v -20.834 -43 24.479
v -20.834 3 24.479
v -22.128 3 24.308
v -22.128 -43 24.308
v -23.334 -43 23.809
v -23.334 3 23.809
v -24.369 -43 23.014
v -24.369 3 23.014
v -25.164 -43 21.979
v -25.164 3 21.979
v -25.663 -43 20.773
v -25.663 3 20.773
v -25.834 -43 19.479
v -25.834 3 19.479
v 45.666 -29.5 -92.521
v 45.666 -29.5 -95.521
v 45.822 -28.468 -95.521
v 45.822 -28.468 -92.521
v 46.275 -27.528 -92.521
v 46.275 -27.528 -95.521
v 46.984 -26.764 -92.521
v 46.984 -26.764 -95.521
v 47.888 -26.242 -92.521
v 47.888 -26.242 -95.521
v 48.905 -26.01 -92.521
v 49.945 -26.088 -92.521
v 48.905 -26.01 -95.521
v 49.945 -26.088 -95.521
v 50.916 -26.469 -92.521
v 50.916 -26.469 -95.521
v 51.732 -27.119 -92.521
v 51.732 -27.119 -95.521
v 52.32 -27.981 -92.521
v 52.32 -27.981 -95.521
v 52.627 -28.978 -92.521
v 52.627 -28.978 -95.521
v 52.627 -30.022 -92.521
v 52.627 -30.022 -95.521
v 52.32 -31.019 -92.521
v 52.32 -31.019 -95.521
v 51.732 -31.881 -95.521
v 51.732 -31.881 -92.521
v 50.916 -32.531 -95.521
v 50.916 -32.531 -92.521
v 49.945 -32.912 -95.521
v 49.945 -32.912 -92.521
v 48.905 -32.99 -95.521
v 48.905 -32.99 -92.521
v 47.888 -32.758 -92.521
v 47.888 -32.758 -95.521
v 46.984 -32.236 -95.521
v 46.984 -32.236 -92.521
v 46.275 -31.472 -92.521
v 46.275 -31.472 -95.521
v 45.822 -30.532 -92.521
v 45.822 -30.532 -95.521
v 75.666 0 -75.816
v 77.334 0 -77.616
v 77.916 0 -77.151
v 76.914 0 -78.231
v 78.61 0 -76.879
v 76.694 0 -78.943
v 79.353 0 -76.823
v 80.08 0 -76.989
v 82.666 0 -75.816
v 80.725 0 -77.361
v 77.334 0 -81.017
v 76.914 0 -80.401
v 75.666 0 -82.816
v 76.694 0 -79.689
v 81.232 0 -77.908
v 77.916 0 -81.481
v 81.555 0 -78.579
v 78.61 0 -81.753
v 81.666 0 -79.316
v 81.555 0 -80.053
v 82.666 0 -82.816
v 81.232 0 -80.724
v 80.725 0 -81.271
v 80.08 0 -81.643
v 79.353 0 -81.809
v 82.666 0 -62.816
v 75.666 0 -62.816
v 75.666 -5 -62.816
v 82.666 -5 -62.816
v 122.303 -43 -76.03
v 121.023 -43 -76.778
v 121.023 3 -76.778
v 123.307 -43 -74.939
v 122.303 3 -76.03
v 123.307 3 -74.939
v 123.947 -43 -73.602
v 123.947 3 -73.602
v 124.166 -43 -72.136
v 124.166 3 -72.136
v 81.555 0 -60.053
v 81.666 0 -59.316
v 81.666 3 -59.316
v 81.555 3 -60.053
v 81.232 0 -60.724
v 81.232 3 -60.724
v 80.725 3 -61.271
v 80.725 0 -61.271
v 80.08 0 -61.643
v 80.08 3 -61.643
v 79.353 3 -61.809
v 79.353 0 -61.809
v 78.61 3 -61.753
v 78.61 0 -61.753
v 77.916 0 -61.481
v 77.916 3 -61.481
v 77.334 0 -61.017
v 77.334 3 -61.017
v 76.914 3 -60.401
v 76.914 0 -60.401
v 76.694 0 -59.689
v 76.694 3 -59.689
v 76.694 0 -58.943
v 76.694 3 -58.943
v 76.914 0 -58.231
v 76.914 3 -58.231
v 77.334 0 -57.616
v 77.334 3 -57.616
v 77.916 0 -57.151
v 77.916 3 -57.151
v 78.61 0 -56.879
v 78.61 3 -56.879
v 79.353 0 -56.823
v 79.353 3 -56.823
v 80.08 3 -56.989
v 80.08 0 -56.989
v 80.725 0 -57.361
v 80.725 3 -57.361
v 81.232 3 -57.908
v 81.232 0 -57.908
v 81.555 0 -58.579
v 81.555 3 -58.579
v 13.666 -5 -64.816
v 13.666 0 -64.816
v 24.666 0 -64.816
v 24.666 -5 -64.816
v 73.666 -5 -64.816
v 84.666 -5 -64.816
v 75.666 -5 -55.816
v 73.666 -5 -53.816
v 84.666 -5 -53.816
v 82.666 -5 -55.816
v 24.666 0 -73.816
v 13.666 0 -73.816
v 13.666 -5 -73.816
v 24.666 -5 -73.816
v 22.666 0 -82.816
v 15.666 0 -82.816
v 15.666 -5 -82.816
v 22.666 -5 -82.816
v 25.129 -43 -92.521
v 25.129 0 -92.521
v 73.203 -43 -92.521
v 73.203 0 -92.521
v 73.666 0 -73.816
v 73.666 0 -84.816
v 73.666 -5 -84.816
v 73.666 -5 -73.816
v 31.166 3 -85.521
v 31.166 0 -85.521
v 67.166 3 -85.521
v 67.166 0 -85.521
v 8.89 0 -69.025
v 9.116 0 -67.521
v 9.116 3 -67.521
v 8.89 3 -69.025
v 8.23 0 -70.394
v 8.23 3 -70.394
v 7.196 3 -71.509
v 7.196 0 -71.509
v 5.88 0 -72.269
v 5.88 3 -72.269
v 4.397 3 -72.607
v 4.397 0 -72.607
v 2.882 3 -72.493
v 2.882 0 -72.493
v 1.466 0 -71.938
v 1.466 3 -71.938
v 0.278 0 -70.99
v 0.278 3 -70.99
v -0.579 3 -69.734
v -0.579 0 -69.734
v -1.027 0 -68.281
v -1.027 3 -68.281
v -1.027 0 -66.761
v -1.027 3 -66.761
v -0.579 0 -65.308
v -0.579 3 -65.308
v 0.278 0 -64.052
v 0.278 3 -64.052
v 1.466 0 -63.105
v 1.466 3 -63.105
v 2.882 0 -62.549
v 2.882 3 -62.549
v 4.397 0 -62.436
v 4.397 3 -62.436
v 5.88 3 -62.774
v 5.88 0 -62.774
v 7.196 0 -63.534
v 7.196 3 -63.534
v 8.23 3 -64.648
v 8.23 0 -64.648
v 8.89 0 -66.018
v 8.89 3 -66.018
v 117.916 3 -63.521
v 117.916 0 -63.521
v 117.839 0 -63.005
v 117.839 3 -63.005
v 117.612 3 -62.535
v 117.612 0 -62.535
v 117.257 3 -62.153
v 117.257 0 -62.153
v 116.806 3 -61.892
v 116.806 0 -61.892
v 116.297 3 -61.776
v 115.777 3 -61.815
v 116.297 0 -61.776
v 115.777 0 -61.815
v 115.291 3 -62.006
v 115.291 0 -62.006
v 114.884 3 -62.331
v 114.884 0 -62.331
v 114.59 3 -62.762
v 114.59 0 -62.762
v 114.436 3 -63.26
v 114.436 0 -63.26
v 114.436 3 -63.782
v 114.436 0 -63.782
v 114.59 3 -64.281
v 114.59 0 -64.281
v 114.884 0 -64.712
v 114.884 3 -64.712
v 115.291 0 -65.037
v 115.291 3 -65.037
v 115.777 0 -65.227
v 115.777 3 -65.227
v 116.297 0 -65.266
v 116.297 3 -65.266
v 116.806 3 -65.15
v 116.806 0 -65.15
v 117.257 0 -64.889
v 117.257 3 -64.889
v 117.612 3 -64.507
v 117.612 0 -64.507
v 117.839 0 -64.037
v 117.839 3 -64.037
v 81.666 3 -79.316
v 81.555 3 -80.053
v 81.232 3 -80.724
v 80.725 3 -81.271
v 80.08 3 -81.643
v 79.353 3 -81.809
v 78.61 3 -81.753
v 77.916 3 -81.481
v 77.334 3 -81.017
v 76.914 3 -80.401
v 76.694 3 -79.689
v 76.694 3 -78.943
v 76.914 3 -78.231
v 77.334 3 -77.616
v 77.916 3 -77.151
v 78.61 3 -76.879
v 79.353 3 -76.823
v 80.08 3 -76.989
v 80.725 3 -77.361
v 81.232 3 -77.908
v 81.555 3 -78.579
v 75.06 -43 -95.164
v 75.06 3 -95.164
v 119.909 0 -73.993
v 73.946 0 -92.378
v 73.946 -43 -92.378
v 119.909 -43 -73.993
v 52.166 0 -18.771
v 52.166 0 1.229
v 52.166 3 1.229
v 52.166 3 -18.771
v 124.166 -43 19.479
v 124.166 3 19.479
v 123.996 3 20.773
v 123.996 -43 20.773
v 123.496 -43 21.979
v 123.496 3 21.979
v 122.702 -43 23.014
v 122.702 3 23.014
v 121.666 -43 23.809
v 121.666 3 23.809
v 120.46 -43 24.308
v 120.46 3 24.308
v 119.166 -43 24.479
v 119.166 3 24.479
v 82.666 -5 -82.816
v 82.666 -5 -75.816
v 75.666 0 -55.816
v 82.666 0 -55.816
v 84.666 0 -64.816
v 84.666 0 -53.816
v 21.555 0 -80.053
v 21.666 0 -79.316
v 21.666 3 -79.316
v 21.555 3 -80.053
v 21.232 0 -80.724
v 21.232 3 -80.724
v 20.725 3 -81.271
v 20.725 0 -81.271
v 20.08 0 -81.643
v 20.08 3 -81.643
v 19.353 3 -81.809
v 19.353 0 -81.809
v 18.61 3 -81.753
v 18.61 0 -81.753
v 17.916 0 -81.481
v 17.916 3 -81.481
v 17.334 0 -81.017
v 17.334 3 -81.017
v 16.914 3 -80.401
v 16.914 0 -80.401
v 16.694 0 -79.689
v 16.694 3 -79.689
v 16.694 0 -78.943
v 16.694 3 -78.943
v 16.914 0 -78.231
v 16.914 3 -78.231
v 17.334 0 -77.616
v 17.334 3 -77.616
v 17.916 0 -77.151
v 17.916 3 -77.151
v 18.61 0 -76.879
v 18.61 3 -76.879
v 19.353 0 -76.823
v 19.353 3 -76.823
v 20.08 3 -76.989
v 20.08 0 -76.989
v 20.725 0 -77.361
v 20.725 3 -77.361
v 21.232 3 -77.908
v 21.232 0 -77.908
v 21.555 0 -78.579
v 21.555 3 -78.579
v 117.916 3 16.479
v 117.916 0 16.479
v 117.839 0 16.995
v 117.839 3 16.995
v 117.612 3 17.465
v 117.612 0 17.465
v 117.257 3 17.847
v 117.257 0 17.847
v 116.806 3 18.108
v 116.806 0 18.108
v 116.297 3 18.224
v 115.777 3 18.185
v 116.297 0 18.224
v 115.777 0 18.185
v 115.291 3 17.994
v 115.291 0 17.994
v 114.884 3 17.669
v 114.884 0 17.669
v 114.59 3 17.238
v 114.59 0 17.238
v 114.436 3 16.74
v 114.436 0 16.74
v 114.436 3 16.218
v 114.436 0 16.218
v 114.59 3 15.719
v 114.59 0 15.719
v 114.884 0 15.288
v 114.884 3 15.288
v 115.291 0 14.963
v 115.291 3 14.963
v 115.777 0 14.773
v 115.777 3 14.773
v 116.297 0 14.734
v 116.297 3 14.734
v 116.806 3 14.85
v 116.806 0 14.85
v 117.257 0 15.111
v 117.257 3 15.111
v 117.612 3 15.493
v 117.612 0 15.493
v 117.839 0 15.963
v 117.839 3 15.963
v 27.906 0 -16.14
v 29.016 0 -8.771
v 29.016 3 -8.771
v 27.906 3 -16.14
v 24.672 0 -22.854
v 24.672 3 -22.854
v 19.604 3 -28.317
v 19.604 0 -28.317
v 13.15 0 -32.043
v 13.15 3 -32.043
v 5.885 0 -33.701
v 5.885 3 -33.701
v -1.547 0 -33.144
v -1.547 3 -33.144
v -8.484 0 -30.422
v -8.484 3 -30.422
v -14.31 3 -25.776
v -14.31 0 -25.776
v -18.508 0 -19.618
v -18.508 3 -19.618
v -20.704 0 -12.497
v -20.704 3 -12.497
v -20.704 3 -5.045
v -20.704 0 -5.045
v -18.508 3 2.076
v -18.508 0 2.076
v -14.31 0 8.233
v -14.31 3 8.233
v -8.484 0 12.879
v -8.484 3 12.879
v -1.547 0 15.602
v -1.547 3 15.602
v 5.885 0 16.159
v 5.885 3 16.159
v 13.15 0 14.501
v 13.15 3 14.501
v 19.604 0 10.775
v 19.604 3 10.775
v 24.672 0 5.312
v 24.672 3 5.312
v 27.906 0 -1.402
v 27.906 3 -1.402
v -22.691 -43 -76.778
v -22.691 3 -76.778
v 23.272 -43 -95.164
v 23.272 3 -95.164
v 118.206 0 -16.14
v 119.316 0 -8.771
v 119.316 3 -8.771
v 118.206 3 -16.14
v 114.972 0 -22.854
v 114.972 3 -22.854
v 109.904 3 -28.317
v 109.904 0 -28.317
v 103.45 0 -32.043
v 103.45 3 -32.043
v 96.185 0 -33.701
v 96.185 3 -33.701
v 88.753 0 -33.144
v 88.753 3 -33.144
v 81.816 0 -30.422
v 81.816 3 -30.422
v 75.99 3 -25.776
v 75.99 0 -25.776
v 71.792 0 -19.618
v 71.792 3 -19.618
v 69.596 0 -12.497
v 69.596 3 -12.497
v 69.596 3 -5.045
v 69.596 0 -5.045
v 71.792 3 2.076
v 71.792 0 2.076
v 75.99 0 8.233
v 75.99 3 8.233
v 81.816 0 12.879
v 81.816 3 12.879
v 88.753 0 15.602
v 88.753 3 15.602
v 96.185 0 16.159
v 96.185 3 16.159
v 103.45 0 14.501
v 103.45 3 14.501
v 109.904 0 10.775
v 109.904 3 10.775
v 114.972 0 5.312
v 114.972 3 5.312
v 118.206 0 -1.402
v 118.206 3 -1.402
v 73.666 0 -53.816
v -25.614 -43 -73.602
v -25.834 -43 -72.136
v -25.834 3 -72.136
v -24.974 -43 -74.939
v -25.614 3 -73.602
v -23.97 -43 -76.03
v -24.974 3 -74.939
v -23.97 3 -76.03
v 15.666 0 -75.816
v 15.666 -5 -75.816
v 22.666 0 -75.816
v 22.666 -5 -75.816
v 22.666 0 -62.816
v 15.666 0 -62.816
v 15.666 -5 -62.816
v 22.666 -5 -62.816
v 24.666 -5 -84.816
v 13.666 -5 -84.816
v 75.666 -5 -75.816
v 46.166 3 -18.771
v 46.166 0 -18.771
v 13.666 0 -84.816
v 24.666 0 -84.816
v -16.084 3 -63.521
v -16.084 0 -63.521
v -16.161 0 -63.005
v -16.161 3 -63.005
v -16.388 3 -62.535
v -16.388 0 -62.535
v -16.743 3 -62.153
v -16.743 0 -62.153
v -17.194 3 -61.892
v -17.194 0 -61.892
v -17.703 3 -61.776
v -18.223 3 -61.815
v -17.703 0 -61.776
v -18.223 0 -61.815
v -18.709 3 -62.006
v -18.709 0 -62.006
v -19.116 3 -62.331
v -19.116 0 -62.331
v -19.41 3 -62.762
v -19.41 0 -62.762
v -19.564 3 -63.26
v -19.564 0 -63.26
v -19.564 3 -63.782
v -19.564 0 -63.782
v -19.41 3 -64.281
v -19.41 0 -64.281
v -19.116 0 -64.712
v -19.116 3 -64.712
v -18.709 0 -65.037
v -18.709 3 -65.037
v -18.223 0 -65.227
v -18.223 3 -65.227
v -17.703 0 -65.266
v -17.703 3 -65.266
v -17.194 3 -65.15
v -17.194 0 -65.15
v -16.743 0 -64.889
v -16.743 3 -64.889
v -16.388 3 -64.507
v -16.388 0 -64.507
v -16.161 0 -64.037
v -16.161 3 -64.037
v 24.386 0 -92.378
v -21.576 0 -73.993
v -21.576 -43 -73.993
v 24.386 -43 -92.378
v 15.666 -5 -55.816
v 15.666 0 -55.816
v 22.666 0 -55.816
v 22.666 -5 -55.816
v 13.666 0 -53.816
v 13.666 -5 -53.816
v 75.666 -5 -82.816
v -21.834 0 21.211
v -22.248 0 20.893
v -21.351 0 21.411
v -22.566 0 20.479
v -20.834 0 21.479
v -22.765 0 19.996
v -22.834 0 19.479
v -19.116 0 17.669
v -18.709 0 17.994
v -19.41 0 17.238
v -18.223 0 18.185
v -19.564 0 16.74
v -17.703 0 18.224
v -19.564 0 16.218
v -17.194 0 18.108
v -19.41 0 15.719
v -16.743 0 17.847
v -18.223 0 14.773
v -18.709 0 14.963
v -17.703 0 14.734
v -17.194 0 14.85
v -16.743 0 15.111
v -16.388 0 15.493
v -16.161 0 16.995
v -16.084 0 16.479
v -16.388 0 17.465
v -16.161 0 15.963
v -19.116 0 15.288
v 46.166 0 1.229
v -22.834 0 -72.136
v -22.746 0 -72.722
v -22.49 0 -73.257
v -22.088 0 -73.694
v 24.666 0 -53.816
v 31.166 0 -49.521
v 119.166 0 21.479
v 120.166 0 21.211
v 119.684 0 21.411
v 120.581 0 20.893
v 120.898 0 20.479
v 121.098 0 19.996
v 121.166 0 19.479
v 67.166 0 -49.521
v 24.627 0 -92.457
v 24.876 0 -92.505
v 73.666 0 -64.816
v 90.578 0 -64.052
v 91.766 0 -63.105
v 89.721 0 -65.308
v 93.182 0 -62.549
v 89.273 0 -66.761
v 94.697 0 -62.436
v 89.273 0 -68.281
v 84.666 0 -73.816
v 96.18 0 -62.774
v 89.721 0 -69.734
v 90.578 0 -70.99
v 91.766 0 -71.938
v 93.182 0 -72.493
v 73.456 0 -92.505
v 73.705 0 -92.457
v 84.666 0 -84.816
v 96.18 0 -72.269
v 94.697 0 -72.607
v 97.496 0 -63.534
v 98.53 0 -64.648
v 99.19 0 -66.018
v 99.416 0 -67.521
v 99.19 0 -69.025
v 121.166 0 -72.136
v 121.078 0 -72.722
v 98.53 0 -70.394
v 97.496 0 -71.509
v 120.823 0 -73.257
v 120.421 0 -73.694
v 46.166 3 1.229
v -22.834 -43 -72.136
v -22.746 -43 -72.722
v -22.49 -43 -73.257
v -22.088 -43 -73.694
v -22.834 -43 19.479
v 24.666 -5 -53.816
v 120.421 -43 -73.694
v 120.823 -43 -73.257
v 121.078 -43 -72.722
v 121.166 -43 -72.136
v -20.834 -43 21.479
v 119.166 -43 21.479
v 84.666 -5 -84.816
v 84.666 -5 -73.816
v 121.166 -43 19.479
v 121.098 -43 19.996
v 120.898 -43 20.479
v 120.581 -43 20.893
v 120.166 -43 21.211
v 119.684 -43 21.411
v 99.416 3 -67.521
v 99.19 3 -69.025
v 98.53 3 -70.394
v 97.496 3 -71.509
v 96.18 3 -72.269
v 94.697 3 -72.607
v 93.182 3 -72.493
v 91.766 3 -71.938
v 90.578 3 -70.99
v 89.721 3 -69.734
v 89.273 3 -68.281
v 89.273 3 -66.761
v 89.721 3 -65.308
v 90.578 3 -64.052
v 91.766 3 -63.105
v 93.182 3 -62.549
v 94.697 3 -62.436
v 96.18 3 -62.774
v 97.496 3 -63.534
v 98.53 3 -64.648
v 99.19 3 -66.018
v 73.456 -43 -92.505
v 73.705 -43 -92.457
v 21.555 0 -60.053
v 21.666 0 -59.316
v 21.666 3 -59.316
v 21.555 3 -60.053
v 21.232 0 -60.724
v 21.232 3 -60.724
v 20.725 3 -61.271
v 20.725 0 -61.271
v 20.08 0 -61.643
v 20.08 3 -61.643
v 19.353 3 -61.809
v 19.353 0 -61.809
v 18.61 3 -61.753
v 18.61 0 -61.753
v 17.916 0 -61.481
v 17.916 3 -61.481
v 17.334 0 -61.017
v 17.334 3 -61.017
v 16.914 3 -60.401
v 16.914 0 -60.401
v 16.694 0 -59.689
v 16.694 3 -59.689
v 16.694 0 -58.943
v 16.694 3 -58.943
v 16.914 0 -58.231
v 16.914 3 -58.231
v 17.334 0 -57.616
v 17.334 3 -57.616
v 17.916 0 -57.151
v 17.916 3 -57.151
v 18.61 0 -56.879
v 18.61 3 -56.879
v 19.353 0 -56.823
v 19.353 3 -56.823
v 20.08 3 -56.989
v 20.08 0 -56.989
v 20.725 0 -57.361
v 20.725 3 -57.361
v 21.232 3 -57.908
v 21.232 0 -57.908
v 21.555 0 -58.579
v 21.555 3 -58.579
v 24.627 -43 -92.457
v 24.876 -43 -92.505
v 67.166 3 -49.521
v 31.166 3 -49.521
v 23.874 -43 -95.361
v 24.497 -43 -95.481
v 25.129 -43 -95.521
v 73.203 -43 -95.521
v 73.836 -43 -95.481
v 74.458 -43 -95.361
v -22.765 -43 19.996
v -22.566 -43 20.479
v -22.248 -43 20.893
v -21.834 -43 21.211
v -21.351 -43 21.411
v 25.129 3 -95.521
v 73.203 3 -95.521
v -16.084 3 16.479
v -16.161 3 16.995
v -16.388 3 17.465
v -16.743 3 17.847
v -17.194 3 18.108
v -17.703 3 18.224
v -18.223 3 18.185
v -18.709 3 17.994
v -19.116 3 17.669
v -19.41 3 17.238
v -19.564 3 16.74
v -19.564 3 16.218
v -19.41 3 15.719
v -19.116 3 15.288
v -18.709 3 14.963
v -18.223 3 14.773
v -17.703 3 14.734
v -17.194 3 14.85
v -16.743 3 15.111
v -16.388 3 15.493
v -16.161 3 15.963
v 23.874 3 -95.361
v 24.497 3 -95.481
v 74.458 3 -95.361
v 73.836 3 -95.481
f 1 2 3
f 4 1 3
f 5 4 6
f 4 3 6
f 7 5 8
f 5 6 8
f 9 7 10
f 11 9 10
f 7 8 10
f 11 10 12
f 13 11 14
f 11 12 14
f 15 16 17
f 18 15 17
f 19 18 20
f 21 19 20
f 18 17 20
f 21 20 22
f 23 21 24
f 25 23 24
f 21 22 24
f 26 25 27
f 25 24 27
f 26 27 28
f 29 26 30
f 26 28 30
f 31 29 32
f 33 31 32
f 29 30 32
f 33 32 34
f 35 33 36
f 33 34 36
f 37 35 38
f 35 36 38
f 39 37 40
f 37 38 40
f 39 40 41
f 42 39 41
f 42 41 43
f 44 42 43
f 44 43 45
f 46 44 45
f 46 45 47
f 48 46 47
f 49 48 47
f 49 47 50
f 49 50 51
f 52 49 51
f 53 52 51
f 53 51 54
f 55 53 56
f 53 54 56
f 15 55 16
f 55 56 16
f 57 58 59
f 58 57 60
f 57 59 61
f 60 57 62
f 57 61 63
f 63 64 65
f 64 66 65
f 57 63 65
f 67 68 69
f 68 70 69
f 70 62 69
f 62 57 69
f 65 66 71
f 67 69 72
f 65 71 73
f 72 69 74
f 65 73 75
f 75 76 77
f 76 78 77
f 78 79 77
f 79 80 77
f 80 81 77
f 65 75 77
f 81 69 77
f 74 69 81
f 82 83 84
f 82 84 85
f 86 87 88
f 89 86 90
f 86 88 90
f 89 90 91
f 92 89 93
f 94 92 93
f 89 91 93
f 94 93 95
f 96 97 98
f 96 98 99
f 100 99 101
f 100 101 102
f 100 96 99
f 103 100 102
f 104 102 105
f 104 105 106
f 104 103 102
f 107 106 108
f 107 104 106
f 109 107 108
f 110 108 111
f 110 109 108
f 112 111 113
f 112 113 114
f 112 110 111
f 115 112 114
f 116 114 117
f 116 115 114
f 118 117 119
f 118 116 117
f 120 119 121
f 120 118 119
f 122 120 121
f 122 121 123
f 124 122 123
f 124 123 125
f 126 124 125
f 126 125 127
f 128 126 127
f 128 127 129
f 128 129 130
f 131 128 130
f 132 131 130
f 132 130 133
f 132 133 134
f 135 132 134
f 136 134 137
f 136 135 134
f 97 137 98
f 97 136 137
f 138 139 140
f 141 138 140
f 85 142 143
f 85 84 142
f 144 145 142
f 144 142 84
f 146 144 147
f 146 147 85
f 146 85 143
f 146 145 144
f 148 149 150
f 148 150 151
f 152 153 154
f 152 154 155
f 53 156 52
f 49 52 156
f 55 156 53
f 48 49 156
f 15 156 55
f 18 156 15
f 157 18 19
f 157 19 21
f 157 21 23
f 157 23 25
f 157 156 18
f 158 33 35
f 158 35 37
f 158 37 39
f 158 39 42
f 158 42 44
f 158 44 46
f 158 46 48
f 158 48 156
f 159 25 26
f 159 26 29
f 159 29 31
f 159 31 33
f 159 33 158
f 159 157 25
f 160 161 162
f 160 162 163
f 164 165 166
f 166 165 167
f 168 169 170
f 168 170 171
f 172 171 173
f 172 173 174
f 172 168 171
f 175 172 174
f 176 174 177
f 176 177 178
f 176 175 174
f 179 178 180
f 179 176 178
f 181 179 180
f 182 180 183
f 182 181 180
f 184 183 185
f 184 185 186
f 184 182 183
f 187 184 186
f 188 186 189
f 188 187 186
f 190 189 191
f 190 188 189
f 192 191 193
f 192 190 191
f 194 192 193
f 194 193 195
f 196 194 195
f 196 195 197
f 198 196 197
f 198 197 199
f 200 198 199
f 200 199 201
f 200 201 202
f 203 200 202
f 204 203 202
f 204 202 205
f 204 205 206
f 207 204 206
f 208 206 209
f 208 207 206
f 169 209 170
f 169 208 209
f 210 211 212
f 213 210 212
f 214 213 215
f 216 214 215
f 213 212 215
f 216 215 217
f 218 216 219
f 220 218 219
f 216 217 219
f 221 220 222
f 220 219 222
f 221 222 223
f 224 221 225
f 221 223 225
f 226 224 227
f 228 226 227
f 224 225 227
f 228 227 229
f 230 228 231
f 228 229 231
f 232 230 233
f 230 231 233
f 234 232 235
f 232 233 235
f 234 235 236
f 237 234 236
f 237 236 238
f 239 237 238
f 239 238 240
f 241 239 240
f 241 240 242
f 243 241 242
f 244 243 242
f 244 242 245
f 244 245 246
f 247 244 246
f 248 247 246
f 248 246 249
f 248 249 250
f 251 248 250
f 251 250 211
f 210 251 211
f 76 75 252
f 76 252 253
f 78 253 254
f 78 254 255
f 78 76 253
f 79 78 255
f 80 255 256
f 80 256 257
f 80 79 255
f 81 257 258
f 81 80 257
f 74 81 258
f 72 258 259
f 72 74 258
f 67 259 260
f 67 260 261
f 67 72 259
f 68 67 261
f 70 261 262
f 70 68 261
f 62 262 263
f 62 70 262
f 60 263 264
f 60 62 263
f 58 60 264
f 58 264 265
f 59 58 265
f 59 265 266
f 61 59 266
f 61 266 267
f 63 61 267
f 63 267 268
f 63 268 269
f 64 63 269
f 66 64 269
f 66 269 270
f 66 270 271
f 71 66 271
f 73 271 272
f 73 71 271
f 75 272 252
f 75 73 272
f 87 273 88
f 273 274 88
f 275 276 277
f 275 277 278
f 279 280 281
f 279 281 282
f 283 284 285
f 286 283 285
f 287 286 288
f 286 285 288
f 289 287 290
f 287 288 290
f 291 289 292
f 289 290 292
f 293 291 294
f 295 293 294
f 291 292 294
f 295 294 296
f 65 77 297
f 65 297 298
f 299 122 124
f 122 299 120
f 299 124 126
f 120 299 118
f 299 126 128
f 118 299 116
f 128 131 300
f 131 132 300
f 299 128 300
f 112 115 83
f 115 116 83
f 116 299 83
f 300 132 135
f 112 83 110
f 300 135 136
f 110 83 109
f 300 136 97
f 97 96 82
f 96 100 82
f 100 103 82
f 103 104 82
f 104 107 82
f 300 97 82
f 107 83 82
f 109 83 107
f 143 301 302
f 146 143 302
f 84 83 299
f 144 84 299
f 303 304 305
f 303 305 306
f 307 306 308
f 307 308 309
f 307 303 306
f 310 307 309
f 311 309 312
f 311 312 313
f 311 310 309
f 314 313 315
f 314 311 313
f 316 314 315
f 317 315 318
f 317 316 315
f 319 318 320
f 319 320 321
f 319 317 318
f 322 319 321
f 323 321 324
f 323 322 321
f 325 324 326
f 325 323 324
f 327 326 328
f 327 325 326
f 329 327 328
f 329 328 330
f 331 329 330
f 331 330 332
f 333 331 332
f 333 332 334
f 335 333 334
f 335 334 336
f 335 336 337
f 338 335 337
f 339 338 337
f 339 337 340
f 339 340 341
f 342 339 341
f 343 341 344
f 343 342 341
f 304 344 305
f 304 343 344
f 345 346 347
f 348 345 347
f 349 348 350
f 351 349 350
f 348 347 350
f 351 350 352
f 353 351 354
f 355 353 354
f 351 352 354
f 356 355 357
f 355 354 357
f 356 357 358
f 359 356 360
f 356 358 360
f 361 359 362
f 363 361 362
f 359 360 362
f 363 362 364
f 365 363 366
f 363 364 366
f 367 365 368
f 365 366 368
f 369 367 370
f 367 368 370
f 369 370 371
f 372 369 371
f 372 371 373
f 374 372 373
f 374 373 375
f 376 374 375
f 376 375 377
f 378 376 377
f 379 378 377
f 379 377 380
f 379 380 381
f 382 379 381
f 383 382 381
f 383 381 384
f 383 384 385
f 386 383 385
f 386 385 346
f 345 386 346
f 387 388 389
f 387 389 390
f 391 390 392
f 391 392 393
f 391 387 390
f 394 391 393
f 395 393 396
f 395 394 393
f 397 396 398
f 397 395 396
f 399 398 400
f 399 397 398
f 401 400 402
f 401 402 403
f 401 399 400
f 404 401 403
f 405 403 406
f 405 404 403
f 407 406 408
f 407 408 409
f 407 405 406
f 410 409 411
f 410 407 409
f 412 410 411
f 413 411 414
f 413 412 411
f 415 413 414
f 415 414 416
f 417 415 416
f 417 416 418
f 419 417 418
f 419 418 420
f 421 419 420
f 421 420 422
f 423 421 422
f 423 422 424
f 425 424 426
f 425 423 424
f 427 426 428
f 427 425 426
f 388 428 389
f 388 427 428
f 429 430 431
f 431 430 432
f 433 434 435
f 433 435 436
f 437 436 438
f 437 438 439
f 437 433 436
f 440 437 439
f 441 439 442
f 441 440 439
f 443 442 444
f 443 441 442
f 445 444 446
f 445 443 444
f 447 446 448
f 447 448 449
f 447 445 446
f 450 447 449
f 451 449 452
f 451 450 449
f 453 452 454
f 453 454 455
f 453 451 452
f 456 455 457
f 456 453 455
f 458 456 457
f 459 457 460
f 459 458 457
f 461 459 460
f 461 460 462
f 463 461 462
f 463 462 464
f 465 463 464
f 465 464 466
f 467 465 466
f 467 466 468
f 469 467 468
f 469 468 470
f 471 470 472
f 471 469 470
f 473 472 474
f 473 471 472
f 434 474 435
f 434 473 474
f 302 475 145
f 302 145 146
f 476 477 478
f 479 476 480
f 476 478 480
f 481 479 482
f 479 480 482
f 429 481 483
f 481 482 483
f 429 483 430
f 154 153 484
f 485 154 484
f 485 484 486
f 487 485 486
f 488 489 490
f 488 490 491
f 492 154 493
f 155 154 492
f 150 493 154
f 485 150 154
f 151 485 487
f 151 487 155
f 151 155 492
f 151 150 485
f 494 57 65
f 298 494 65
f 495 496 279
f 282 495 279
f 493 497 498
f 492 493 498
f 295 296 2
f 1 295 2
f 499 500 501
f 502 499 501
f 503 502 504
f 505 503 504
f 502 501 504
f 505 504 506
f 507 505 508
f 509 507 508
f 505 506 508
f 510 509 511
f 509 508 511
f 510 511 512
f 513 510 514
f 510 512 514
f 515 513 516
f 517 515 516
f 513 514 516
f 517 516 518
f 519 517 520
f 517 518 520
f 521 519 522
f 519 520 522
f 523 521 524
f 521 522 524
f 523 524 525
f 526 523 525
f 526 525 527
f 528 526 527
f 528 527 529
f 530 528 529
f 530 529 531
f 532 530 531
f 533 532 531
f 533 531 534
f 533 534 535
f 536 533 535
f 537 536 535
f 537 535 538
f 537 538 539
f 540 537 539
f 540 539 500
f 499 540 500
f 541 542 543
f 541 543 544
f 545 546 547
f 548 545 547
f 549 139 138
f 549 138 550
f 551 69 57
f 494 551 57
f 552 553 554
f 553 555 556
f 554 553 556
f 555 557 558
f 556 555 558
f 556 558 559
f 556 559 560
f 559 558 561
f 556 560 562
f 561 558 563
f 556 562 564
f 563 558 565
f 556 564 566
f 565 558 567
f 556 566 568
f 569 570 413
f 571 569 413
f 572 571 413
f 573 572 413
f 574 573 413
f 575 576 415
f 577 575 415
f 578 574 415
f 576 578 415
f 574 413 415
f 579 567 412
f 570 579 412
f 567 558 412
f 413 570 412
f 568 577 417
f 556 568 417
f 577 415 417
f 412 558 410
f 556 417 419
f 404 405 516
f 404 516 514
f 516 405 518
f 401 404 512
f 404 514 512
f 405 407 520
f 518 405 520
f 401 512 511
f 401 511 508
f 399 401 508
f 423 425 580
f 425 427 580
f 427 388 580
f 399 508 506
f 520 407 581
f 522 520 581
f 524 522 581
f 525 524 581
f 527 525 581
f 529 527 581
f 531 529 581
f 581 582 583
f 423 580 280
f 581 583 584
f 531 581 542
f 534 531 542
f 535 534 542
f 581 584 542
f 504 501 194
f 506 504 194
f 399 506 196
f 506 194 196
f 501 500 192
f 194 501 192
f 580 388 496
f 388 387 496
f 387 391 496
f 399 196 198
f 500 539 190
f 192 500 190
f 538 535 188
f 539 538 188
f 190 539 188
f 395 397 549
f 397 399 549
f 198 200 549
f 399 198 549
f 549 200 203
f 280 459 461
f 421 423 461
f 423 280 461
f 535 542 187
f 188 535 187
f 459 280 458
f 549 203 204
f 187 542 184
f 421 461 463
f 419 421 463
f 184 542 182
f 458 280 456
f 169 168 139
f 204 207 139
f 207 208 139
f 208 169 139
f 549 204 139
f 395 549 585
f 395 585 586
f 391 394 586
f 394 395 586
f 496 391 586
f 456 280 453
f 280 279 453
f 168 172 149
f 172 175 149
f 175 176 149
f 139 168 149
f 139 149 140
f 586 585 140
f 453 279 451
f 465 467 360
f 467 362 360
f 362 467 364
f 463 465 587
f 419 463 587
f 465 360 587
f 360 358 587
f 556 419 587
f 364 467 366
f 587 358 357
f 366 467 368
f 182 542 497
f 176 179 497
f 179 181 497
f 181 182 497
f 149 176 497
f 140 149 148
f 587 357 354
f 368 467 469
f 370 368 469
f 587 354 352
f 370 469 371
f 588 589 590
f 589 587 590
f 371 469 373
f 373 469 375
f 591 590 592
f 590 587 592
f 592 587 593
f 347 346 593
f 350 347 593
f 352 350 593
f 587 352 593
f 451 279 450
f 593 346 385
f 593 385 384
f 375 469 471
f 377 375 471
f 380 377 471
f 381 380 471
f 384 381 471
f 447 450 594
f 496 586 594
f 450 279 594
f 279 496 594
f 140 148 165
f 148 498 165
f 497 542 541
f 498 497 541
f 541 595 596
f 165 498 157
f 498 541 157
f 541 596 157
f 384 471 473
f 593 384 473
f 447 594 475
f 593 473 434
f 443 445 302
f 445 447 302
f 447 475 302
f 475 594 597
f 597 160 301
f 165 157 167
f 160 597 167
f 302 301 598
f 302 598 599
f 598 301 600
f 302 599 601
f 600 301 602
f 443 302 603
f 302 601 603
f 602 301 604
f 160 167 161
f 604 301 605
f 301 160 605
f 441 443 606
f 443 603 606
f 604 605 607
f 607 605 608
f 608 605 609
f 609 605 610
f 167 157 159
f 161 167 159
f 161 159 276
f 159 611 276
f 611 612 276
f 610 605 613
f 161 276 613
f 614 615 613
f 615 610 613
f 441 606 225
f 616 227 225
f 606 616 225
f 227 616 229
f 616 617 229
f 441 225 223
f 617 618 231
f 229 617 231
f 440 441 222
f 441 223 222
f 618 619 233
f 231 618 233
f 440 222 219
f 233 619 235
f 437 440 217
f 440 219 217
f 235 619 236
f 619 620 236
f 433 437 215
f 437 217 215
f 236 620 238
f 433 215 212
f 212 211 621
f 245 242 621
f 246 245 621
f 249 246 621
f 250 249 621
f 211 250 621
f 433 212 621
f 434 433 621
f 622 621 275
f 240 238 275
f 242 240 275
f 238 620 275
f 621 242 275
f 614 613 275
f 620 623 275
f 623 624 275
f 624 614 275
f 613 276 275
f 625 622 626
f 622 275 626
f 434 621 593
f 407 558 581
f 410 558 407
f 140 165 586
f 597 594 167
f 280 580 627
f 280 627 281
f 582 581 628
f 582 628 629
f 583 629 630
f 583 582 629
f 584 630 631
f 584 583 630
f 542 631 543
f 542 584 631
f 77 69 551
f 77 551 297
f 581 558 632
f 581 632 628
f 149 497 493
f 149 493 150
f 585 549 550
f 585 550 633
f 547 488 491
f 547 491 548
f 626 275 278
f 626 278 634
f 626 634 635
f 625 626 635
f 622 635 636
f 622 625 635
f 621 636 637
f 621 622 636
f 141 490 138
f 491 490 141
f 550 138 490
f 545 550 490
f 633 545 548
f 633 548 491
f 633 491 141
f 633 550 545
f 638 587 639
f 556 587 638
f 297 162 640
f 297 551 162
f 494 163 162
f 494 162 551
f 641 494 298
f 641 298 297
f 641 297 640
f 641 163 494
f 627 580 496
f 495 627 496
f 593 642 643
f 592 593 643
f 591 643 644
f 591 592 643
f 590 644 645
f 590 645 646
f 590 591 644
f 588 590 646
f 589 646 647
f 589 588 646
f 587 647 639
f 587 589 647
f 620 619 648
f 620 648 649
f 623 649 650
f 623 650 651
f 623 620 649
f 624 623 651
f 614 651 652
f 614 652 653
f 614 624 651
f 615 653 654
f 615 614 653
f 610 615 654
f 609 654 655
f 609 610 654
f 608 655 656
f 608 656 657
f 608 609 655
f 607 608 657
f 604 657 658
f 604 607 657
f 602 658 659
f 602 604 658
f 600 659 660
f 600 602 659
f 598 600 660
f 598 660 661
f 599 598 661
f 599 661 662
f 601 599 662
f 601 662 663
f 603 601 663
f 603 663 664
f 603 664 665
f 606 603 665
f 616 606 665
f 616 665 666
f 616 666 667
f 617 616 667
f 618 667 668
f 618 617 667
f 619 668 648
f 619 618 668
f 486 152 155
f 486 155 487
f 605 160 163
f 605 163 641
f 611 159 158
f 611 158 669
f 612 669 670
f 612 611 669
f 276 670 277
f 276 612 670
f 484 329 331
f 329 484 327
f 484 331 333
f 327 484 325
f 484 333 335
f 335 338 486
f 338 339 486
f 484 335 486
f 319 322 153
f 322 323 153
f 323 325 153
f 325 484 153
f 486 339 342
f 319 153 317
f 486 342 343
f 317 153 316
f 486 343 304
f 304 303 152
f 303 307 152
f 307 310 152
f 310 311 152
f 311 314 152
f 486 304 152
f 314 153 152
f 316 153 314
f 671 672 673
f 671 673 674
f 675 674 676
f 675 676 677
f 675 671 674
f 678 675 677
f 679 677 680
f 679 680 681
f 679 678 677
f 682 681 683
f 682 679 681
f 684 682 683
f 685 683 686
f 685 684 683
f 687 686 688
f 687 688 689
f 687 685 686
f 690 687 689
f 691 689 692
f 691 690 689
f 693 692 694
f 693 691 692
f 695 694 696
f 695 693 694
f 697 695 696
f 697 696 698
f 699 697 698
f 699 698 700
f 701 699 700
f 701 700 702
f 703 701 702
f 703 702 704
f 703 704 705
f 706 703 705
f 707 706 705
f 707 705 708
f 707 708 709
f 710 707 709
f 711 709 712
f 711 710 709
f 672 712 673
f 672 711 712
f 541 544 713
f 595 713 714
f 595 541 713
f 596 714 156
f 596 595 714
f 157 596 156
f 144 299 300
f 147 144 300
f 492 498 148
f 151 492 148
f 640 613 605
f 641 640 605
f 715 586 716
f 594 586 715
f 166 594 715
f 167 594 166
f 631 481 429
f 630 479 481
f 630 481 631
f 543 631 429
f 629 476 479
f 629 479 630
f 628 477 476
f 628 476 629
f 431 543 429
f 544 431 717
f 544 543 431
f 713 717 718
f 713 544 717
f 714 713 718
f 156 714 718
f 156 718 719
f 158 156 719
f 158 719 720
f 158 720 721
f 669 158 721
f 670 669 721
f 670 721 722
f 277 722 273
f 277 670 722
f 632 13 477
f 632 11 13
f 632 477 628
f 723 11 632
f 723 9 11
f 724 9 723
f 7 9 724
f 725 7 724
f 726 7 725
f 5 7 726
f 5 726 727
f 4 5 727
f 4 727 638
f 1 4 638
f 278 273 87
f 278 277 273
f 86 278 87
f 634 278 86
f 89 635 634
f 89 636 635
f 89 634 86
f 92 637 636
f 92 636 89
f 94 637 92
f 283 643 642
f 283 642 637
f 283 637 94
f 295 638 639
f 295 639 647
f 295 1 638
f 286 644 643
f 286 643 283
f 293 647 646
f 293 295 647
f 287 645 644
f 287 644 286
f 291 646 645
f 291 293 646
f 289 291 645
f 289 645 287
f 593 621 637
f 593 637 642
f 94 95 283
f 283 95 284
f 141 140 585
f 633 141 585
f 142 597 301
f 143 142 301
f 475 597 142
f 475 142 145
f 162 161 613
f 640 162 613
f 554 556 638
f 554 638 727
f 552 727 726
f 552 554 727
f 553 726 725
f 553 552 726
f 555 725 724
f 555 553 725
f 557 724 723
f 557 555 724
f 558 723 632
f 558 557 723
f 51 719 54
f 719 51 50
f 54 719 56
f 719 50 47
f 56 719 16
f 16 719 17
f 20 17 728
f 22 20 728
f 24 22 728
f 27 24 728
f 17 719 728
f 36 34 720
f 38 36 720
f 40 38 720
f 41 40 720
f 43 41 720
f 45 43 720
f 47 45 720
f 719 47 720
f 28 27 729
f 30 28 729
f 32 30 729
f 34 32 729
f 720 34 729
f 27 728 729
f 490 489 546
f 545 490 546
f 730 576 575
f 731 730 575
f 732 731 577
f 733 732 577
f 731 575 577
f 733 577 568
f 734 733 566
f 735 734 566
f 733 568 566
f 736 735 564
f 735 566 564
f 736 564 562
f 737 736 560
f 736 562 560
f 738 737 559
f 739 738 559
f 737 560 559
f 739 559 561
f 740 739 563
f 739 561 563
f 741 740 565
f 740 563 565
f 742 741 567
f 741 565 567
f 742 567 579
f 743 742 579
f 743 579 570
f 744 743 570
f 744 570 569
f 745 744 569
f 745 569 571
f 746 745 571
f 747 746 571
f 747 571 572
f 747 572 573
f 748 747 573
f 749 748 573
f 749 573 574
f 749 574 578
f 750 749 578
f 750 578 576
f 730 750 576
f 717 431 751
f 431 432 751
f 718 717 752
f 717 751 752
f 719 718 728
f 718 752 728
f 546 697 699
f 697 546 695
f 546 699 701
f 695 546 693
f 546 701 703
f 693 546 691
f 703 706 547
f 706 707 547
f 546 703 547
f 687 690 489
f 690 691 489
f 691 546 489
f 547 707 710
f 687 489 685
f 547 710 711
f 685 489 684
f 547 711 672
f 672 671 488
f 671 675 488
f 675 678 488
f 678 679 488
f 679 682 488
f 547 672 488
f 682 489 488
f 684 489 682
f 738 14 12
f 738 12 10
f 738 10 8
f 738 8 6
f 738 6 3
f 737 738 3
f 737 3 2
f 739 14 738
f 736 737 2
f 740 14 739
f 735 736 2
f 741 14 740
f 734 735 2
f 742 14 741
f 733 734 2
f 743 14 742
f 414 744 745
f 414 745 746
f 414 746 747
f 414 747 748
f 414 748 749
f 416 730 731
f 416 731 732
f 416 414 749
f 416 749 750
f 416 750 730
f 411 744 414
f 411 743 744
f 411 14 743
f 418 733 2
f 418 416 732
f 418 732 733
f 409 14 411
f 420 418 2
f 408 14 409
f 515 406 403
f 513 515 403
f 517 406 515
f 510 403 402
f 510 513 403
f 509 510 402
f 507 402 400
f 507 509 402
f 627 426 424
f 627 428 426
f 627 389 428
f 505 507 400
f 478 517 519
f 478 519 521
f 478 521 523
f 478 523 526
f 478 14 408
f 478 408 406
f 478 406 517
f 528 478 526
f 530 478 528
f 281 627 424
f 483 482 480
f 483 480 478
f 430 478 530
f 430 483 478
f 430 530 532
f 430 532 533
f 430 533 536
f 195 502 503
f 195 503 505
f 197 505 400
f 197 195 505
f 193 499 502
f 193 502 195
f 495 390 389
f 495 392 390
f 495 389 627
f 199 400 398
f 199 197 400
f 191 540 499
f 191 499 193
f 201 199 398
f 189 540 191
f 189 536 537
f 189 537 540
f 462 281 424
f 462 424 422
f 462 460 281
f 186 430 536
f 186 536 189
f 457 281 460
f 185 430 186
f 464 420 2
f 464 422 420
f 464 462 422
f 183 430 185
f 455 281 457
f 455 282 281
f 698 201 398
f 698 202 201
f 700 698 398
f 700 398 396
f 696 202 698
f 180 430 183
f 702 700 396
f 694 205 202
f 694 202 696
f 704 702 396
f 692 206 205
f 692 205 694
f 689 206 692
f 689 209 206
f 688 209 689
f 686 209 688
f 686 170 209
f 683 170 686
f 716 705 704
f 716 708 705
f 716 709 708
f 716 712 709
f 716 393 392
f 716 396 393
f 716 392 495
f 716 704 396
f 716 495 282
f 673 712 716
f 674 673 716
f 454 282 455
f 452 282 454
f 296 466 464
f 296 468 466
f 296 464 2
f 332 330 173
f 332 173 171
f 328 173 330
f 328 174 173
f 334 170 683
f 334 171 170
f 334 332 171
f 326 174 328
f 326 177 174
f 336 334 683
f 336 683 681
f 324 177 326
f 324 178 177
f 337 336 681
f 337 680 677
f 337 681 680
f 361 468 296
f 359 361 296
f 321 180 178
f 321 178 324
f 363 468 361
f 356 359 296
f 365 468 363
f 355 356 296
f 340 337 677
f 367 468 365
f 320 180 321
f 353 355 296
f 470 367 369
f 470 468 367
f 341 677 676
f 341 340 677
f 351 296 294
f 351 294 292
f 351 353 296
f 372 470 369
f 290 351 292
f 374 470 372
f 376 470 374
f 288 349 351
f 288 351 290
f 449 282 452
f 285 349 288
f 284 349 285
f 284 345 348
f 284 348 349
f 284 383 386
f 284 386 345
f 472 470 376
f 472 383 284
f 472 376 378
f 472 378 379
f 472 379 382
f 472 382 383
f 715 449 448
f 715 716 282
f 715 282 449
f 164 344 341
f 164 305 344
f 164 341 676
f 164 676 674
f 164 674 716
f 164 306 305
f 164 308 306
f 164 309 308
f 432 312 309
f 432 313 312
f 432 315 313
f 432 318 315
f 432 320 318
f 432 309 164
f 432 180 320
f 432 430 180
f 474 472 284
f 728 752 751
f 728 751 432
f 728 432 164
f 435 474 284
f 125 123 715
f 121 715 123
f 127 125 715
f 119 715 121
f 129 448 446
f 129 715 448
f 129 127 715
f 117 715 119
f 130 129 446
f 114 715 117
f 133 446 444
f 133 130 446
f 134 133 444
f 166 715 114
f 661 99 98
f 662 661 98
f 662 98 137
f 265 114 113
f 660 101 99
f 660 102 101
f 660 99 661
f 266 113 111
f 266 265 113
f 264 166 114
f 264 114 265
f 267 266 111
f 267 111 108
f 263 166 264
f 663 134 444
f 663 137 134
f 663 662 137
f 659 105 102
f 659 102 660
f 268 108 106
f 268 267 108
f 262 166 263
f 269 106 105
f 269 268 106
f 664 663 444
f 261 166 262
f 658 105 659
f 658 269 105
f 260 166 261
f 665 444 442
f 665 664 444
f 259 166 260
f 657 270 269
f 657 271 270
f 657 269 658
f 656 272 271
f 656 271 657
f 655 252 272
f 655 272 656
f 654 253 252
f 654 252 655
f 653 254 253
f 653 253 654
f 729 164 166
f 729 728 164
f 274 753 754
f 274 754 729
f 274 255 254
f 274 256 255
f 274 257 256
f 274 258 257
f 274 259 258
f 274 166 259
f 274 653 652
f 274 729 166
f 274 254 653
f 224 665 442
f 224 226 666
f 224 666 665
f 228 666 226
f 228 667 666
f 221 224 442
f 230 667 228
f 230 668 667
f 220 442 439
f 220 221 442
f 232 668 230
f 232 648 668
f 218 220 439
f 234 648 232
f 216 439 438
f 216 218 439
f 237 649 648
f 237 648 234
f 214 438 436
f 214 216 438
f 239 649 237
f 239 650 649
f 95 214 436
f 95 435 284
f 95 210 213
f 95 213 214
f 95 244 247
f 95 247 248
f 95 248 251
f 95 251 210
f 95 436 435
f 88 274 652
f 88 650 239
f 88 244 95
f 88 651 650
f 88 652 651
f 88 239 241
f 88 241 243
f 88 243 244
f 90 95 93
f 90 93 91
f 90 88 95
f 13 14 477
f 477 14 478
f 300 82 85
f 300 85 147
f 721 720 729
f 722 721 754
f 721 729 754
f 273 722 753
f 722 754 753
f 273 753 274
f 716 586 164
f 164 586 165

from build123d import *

# Parameters (mm, degrees)
SKETCH1_R           = 25
SKETCH1_R_2         = 5.1
SKETCH1_R_3         = 2.5
SKETCH1_W           = 36
SKETCH1_H           = 36
SKETCH1_W_2         = 6
SKETCH1_H_2         = 20
BOSS_EXTRUDE1_DEPTH = 3
BOSS_EXTRUDE2_DEPTH = 43
SKETCH4_W           = 11
SKETCH4_H           = 11
SKETCH4_W_2         = 7
SKETCH4_H_2         = 7
BOSS_EXTRUDE3_DEPTH = 5
SKETCH5_R           = 1.75
CUT_EXTRUDE1_DEPTH  = 5
SKETCH6_R           = 3.5
CUT_EXTRUDE2_DEPTH  = 3


with BuildPart() as part:
    # Sketch1 → Boss-Extrude1 (new body)
    with BuildSketch(Plane(origin=(0, 0, 0), x_dir=(1, 0, 0), z_dir=(0, 1, 0))):
        with BuildLine():
            Line((-20.833630945, -24.478740106), (119.166369055, -24.478740106))
            ThreePointArc((119.166369055, -24.478740106), (122.701902961, -23.014274012), (124.166369055, -19.478740106))
            Line((124.166369055, -19.478740106), (124.166369055, 72.136095087))
            ThreePointArc((124.166369055, 72.136095087), (123.306705208, 74.939239133), (121.023322437, 76.778478541))
            Line((121.023322437, 76.778478541), (75.060410419, 95.163643348))
            ThreePointArc((75.060410419, 95.163643348), (74.148994643, 95.431041828), (73.203457037, 95.521259894))
            Line((73.203457037, 95.521259894), (25.129281073, 95.521259894))
            ThreePointArc((25.129281073, 95.521259894), (24.183743467, 95.431041828), (23.272327691, 95.163643348))
            Line((23.272327691, 95.163643348), (-22.690584327, 76.778478541))
            ThreePointArc((-22.690584327, 76.778478541), (-24.973967097, 74.939239133), (-25.833630945, 72.136095087))
            Line((-25.833630945, 72.136095087), (-25.833630945, -19.478740106))
            ThreePointArc((-25.833630945, -19.478740106), (-24.369164851, -23.014274012), (-20.833630945, -24.478740106))
        make_face()
        with Locations((4.016369055, 8.771259894)):
            Circle(SKETCH1_R, mode=Mode.SUBTRACT)
        with Locations((94.316369055, 8.771259894)):
            Circle(SKETCH1_R, mode=Mode.SUBTRACT)
        with Locations((4.016369055, 67.521259894)):
            Circle(SKETCH1_R_2, mode=Mode.SUBTRACT)
        with Locations((94.316369055, 67.521259894)):
            Circle(SKETCH1_R_2, mode=Mode.SUBTRACT)
        with Locations((19.166369055, 79.316074422)):
            Circle(SKETCH1_R_3, mode=Mode.SUBTRACT)
        with Locations((19.166369055, 59.316074422)):
            Circle(SKETCH1_R_3, mode=Mode.SUBTRACT)
        with Locations((79.166369055, 59.316074422)):
            Circle(SKETCH1_R_3, mode=Mode.SUBTRACT)
        with Locations((79.166369055, 79.316074422)):
            Circle(SKETCH1_R_3, mode=Mode.SUBTRACT)
        with Locations((49.166369055, 67.521259894)):
            Rectangle(SKETCH1_W, SKETCH1_H, mode=Mode.SUBTRACT)
        with Locations((49.166369055, 8.771259894)):
            Rectangle(SKETCH1_W_2, SKETCH1_H_2, mode=Mode.SUBTRACT)
    extrude(amount=BOSS_EXTRUDE1_DEPTH)

    # Sketch2 → Boss-Extrude2 (add)
    with BuildSketch(Plane.XZ):
        with BuildLine():
            Line((-25.833630945, 19.478740106), (-25.833630945, -72.136095087))
            ThreePointArc((-25.833630945, -72.136095087), (-24.973967097, -74.939239133), (-22.690584327, -76.778478541))
            Line((-22.690584327, -76.778478541), (23.272327691, -95.163643348))
            ThreePointArc((23.272327691, -95.163643348), (24.183743467, -95.431041828), (25.129281073, -95.521259894))
            Line((25.129281073, -95.521259894), (73.203457037, -95.521259894))
            ThreePointArc((73.203457037, -95.521259894), (74.148994643, -95.431041828), (75.060410419, -95.163643348))
            Line((75.060410419, -95.163643348), (121.023322437, -76.778478541))
            ThreePointArc((121.023322437, -76.778478541), (123.306705208, -74.939239133), (124.166369055, -72.136095087))
            Line((124.166369055, -72.136095087), (124.166369055, 19.478740106))
            ThreePointArc((124.166369055, 19.478740106), (122.701902961, 23.014274012), (119.166369055, 24.478740106))
            Line((119.166369055, 24.478740106), (-20.833630945, 24.478740106))
            ThreePointArc((-20.833630945, 24.478740106), (-24.369164851, 23.014274012), (-25.833630945, 19.478740106))
        make_face()
        with BuildLine():
            Line((119.166369055, 21.478740106), (-20.833630945, 21.478740106))
            ThreePointArc((-20.833630945, 21.478740106), (-22.247844507, 20.892953668), (-22.833630945, 19.478740106))
            Line((-22.833630945, 19.478740106), (-22.833630945, -72.136095087))
            ThreePointArc((-22.833630945, -72.136095087), (-22.489765406, -73.257352705), (-21.576412297, -73.993048469))
            Line((-21.576412297, -73.993048469), (24.38649972, -92.378213276))
            ThreePointArc((24.38649972, -92.378213276), (24.751066031, -92.485172667), (25.129281073, -92.521259894))
            Line((25.129281073, -92.521259894), (73.203457037, -92.521259894))
            ThreePointArc((73.203457037, -92.521259894), (73.58167208, -92.485172667), (73.94623839, -92.378213276))
            Line((73.94623839, -92.378213276), (119.909150408, -73.993048469))
            ThreePointArc((119.909150408, -73.993048469), (120.822503516, -73.257352705), (121.166369055, -72.136095087))
            Line((121.166369055, -72.136095087), (121.166369055, 19.478740106))
            ThreePointArc((121.166369055, 19.478740106), (120.580582618, 20.892953668), (119.166369055, 21.478740106))
        make_face(mode=Mode.SUBTRACT)
    extrude(amount=BOSS_EXTRUDE2_DEPTH)

    # Sketch4 → Boss-Extrude3 (add)
    with BuildSketch(Plane.XZ):
        with Locations((79.166369055, -79.316074422)):
            Rectangle(SKETCH4_W, SKETCH4_H)
        with Locations((79.166369055, -79.316074422)):
            Rectangle(SKETCH4_W_2, SKETCH4_H_2, mode=Mode.SUBTRACT)
        with Locations((79.166369055, -59.316074422)):
            Rectangle(SKETCH4_W, SKETCH4_H)
        with Locations((79.166369055, -59.316074422)):
            Rectangle(SKETCH4_W_2, SKETCH4_H_2, mode=Mode.SUBTRACT)
        with Locations((19.166369055, -59.316074422)):
            Rectangle(SKETCH4_W, SKETCH4_H)
        with Locations((19.166369055, -59.316074422)):
            Rectangle(SKETCH4_W_2, SKETCH4_H_2, mode=Mode.SUBTRACT)
        with Locations((19.166369055, -79.316074422)):
            Rectangle(SKETCH4_W, SKETCH4_H)
        with Locations((19.166369055, -79.316074422)):
            Rectangle(SKETCH4_W_2, SKETCH4_H_2, mode=Mode.SUBTRACT)
    extrude(amount=BOSS_EXTRUDE3_DEPTH)

    # Sketch5 → Cut-Extrude1 (cut)
    with BuildSketch(Plane.XZ):
        with Locations((-17.833630945, 16.478740106)):
            Circle(SKETCH5_R)
        with Locations((116.166369055, 16.478740106)):
            Circle(SKETCH5_R)
        with Locations((-17.833630945, -63.521259894)):
            Circle(SKETCH5_R)
        with Locations((116.166369055, -63.521259894)):
            Circle(SKETCH5_R)
    extrude(amount=-CUT_EXTRUDE1_DEPTH, mode=Mode.SUBTRACT)

    # Sketch6 → Cut-Extrude2 (cut)
    with BuildSketch(Plane(origin=(0, 0, -95.521259894), x_dir=(-1, 0, 0), z_dir=(0, 0, -1))):
        with Locations((-49.166369055, -29.5)):
            Circle(SKETCH6_R)
    extrude(amount=-CUT_EXTRUDE2_DEPTH, mode=Mode.SUBTRACT)


solid = part.part
